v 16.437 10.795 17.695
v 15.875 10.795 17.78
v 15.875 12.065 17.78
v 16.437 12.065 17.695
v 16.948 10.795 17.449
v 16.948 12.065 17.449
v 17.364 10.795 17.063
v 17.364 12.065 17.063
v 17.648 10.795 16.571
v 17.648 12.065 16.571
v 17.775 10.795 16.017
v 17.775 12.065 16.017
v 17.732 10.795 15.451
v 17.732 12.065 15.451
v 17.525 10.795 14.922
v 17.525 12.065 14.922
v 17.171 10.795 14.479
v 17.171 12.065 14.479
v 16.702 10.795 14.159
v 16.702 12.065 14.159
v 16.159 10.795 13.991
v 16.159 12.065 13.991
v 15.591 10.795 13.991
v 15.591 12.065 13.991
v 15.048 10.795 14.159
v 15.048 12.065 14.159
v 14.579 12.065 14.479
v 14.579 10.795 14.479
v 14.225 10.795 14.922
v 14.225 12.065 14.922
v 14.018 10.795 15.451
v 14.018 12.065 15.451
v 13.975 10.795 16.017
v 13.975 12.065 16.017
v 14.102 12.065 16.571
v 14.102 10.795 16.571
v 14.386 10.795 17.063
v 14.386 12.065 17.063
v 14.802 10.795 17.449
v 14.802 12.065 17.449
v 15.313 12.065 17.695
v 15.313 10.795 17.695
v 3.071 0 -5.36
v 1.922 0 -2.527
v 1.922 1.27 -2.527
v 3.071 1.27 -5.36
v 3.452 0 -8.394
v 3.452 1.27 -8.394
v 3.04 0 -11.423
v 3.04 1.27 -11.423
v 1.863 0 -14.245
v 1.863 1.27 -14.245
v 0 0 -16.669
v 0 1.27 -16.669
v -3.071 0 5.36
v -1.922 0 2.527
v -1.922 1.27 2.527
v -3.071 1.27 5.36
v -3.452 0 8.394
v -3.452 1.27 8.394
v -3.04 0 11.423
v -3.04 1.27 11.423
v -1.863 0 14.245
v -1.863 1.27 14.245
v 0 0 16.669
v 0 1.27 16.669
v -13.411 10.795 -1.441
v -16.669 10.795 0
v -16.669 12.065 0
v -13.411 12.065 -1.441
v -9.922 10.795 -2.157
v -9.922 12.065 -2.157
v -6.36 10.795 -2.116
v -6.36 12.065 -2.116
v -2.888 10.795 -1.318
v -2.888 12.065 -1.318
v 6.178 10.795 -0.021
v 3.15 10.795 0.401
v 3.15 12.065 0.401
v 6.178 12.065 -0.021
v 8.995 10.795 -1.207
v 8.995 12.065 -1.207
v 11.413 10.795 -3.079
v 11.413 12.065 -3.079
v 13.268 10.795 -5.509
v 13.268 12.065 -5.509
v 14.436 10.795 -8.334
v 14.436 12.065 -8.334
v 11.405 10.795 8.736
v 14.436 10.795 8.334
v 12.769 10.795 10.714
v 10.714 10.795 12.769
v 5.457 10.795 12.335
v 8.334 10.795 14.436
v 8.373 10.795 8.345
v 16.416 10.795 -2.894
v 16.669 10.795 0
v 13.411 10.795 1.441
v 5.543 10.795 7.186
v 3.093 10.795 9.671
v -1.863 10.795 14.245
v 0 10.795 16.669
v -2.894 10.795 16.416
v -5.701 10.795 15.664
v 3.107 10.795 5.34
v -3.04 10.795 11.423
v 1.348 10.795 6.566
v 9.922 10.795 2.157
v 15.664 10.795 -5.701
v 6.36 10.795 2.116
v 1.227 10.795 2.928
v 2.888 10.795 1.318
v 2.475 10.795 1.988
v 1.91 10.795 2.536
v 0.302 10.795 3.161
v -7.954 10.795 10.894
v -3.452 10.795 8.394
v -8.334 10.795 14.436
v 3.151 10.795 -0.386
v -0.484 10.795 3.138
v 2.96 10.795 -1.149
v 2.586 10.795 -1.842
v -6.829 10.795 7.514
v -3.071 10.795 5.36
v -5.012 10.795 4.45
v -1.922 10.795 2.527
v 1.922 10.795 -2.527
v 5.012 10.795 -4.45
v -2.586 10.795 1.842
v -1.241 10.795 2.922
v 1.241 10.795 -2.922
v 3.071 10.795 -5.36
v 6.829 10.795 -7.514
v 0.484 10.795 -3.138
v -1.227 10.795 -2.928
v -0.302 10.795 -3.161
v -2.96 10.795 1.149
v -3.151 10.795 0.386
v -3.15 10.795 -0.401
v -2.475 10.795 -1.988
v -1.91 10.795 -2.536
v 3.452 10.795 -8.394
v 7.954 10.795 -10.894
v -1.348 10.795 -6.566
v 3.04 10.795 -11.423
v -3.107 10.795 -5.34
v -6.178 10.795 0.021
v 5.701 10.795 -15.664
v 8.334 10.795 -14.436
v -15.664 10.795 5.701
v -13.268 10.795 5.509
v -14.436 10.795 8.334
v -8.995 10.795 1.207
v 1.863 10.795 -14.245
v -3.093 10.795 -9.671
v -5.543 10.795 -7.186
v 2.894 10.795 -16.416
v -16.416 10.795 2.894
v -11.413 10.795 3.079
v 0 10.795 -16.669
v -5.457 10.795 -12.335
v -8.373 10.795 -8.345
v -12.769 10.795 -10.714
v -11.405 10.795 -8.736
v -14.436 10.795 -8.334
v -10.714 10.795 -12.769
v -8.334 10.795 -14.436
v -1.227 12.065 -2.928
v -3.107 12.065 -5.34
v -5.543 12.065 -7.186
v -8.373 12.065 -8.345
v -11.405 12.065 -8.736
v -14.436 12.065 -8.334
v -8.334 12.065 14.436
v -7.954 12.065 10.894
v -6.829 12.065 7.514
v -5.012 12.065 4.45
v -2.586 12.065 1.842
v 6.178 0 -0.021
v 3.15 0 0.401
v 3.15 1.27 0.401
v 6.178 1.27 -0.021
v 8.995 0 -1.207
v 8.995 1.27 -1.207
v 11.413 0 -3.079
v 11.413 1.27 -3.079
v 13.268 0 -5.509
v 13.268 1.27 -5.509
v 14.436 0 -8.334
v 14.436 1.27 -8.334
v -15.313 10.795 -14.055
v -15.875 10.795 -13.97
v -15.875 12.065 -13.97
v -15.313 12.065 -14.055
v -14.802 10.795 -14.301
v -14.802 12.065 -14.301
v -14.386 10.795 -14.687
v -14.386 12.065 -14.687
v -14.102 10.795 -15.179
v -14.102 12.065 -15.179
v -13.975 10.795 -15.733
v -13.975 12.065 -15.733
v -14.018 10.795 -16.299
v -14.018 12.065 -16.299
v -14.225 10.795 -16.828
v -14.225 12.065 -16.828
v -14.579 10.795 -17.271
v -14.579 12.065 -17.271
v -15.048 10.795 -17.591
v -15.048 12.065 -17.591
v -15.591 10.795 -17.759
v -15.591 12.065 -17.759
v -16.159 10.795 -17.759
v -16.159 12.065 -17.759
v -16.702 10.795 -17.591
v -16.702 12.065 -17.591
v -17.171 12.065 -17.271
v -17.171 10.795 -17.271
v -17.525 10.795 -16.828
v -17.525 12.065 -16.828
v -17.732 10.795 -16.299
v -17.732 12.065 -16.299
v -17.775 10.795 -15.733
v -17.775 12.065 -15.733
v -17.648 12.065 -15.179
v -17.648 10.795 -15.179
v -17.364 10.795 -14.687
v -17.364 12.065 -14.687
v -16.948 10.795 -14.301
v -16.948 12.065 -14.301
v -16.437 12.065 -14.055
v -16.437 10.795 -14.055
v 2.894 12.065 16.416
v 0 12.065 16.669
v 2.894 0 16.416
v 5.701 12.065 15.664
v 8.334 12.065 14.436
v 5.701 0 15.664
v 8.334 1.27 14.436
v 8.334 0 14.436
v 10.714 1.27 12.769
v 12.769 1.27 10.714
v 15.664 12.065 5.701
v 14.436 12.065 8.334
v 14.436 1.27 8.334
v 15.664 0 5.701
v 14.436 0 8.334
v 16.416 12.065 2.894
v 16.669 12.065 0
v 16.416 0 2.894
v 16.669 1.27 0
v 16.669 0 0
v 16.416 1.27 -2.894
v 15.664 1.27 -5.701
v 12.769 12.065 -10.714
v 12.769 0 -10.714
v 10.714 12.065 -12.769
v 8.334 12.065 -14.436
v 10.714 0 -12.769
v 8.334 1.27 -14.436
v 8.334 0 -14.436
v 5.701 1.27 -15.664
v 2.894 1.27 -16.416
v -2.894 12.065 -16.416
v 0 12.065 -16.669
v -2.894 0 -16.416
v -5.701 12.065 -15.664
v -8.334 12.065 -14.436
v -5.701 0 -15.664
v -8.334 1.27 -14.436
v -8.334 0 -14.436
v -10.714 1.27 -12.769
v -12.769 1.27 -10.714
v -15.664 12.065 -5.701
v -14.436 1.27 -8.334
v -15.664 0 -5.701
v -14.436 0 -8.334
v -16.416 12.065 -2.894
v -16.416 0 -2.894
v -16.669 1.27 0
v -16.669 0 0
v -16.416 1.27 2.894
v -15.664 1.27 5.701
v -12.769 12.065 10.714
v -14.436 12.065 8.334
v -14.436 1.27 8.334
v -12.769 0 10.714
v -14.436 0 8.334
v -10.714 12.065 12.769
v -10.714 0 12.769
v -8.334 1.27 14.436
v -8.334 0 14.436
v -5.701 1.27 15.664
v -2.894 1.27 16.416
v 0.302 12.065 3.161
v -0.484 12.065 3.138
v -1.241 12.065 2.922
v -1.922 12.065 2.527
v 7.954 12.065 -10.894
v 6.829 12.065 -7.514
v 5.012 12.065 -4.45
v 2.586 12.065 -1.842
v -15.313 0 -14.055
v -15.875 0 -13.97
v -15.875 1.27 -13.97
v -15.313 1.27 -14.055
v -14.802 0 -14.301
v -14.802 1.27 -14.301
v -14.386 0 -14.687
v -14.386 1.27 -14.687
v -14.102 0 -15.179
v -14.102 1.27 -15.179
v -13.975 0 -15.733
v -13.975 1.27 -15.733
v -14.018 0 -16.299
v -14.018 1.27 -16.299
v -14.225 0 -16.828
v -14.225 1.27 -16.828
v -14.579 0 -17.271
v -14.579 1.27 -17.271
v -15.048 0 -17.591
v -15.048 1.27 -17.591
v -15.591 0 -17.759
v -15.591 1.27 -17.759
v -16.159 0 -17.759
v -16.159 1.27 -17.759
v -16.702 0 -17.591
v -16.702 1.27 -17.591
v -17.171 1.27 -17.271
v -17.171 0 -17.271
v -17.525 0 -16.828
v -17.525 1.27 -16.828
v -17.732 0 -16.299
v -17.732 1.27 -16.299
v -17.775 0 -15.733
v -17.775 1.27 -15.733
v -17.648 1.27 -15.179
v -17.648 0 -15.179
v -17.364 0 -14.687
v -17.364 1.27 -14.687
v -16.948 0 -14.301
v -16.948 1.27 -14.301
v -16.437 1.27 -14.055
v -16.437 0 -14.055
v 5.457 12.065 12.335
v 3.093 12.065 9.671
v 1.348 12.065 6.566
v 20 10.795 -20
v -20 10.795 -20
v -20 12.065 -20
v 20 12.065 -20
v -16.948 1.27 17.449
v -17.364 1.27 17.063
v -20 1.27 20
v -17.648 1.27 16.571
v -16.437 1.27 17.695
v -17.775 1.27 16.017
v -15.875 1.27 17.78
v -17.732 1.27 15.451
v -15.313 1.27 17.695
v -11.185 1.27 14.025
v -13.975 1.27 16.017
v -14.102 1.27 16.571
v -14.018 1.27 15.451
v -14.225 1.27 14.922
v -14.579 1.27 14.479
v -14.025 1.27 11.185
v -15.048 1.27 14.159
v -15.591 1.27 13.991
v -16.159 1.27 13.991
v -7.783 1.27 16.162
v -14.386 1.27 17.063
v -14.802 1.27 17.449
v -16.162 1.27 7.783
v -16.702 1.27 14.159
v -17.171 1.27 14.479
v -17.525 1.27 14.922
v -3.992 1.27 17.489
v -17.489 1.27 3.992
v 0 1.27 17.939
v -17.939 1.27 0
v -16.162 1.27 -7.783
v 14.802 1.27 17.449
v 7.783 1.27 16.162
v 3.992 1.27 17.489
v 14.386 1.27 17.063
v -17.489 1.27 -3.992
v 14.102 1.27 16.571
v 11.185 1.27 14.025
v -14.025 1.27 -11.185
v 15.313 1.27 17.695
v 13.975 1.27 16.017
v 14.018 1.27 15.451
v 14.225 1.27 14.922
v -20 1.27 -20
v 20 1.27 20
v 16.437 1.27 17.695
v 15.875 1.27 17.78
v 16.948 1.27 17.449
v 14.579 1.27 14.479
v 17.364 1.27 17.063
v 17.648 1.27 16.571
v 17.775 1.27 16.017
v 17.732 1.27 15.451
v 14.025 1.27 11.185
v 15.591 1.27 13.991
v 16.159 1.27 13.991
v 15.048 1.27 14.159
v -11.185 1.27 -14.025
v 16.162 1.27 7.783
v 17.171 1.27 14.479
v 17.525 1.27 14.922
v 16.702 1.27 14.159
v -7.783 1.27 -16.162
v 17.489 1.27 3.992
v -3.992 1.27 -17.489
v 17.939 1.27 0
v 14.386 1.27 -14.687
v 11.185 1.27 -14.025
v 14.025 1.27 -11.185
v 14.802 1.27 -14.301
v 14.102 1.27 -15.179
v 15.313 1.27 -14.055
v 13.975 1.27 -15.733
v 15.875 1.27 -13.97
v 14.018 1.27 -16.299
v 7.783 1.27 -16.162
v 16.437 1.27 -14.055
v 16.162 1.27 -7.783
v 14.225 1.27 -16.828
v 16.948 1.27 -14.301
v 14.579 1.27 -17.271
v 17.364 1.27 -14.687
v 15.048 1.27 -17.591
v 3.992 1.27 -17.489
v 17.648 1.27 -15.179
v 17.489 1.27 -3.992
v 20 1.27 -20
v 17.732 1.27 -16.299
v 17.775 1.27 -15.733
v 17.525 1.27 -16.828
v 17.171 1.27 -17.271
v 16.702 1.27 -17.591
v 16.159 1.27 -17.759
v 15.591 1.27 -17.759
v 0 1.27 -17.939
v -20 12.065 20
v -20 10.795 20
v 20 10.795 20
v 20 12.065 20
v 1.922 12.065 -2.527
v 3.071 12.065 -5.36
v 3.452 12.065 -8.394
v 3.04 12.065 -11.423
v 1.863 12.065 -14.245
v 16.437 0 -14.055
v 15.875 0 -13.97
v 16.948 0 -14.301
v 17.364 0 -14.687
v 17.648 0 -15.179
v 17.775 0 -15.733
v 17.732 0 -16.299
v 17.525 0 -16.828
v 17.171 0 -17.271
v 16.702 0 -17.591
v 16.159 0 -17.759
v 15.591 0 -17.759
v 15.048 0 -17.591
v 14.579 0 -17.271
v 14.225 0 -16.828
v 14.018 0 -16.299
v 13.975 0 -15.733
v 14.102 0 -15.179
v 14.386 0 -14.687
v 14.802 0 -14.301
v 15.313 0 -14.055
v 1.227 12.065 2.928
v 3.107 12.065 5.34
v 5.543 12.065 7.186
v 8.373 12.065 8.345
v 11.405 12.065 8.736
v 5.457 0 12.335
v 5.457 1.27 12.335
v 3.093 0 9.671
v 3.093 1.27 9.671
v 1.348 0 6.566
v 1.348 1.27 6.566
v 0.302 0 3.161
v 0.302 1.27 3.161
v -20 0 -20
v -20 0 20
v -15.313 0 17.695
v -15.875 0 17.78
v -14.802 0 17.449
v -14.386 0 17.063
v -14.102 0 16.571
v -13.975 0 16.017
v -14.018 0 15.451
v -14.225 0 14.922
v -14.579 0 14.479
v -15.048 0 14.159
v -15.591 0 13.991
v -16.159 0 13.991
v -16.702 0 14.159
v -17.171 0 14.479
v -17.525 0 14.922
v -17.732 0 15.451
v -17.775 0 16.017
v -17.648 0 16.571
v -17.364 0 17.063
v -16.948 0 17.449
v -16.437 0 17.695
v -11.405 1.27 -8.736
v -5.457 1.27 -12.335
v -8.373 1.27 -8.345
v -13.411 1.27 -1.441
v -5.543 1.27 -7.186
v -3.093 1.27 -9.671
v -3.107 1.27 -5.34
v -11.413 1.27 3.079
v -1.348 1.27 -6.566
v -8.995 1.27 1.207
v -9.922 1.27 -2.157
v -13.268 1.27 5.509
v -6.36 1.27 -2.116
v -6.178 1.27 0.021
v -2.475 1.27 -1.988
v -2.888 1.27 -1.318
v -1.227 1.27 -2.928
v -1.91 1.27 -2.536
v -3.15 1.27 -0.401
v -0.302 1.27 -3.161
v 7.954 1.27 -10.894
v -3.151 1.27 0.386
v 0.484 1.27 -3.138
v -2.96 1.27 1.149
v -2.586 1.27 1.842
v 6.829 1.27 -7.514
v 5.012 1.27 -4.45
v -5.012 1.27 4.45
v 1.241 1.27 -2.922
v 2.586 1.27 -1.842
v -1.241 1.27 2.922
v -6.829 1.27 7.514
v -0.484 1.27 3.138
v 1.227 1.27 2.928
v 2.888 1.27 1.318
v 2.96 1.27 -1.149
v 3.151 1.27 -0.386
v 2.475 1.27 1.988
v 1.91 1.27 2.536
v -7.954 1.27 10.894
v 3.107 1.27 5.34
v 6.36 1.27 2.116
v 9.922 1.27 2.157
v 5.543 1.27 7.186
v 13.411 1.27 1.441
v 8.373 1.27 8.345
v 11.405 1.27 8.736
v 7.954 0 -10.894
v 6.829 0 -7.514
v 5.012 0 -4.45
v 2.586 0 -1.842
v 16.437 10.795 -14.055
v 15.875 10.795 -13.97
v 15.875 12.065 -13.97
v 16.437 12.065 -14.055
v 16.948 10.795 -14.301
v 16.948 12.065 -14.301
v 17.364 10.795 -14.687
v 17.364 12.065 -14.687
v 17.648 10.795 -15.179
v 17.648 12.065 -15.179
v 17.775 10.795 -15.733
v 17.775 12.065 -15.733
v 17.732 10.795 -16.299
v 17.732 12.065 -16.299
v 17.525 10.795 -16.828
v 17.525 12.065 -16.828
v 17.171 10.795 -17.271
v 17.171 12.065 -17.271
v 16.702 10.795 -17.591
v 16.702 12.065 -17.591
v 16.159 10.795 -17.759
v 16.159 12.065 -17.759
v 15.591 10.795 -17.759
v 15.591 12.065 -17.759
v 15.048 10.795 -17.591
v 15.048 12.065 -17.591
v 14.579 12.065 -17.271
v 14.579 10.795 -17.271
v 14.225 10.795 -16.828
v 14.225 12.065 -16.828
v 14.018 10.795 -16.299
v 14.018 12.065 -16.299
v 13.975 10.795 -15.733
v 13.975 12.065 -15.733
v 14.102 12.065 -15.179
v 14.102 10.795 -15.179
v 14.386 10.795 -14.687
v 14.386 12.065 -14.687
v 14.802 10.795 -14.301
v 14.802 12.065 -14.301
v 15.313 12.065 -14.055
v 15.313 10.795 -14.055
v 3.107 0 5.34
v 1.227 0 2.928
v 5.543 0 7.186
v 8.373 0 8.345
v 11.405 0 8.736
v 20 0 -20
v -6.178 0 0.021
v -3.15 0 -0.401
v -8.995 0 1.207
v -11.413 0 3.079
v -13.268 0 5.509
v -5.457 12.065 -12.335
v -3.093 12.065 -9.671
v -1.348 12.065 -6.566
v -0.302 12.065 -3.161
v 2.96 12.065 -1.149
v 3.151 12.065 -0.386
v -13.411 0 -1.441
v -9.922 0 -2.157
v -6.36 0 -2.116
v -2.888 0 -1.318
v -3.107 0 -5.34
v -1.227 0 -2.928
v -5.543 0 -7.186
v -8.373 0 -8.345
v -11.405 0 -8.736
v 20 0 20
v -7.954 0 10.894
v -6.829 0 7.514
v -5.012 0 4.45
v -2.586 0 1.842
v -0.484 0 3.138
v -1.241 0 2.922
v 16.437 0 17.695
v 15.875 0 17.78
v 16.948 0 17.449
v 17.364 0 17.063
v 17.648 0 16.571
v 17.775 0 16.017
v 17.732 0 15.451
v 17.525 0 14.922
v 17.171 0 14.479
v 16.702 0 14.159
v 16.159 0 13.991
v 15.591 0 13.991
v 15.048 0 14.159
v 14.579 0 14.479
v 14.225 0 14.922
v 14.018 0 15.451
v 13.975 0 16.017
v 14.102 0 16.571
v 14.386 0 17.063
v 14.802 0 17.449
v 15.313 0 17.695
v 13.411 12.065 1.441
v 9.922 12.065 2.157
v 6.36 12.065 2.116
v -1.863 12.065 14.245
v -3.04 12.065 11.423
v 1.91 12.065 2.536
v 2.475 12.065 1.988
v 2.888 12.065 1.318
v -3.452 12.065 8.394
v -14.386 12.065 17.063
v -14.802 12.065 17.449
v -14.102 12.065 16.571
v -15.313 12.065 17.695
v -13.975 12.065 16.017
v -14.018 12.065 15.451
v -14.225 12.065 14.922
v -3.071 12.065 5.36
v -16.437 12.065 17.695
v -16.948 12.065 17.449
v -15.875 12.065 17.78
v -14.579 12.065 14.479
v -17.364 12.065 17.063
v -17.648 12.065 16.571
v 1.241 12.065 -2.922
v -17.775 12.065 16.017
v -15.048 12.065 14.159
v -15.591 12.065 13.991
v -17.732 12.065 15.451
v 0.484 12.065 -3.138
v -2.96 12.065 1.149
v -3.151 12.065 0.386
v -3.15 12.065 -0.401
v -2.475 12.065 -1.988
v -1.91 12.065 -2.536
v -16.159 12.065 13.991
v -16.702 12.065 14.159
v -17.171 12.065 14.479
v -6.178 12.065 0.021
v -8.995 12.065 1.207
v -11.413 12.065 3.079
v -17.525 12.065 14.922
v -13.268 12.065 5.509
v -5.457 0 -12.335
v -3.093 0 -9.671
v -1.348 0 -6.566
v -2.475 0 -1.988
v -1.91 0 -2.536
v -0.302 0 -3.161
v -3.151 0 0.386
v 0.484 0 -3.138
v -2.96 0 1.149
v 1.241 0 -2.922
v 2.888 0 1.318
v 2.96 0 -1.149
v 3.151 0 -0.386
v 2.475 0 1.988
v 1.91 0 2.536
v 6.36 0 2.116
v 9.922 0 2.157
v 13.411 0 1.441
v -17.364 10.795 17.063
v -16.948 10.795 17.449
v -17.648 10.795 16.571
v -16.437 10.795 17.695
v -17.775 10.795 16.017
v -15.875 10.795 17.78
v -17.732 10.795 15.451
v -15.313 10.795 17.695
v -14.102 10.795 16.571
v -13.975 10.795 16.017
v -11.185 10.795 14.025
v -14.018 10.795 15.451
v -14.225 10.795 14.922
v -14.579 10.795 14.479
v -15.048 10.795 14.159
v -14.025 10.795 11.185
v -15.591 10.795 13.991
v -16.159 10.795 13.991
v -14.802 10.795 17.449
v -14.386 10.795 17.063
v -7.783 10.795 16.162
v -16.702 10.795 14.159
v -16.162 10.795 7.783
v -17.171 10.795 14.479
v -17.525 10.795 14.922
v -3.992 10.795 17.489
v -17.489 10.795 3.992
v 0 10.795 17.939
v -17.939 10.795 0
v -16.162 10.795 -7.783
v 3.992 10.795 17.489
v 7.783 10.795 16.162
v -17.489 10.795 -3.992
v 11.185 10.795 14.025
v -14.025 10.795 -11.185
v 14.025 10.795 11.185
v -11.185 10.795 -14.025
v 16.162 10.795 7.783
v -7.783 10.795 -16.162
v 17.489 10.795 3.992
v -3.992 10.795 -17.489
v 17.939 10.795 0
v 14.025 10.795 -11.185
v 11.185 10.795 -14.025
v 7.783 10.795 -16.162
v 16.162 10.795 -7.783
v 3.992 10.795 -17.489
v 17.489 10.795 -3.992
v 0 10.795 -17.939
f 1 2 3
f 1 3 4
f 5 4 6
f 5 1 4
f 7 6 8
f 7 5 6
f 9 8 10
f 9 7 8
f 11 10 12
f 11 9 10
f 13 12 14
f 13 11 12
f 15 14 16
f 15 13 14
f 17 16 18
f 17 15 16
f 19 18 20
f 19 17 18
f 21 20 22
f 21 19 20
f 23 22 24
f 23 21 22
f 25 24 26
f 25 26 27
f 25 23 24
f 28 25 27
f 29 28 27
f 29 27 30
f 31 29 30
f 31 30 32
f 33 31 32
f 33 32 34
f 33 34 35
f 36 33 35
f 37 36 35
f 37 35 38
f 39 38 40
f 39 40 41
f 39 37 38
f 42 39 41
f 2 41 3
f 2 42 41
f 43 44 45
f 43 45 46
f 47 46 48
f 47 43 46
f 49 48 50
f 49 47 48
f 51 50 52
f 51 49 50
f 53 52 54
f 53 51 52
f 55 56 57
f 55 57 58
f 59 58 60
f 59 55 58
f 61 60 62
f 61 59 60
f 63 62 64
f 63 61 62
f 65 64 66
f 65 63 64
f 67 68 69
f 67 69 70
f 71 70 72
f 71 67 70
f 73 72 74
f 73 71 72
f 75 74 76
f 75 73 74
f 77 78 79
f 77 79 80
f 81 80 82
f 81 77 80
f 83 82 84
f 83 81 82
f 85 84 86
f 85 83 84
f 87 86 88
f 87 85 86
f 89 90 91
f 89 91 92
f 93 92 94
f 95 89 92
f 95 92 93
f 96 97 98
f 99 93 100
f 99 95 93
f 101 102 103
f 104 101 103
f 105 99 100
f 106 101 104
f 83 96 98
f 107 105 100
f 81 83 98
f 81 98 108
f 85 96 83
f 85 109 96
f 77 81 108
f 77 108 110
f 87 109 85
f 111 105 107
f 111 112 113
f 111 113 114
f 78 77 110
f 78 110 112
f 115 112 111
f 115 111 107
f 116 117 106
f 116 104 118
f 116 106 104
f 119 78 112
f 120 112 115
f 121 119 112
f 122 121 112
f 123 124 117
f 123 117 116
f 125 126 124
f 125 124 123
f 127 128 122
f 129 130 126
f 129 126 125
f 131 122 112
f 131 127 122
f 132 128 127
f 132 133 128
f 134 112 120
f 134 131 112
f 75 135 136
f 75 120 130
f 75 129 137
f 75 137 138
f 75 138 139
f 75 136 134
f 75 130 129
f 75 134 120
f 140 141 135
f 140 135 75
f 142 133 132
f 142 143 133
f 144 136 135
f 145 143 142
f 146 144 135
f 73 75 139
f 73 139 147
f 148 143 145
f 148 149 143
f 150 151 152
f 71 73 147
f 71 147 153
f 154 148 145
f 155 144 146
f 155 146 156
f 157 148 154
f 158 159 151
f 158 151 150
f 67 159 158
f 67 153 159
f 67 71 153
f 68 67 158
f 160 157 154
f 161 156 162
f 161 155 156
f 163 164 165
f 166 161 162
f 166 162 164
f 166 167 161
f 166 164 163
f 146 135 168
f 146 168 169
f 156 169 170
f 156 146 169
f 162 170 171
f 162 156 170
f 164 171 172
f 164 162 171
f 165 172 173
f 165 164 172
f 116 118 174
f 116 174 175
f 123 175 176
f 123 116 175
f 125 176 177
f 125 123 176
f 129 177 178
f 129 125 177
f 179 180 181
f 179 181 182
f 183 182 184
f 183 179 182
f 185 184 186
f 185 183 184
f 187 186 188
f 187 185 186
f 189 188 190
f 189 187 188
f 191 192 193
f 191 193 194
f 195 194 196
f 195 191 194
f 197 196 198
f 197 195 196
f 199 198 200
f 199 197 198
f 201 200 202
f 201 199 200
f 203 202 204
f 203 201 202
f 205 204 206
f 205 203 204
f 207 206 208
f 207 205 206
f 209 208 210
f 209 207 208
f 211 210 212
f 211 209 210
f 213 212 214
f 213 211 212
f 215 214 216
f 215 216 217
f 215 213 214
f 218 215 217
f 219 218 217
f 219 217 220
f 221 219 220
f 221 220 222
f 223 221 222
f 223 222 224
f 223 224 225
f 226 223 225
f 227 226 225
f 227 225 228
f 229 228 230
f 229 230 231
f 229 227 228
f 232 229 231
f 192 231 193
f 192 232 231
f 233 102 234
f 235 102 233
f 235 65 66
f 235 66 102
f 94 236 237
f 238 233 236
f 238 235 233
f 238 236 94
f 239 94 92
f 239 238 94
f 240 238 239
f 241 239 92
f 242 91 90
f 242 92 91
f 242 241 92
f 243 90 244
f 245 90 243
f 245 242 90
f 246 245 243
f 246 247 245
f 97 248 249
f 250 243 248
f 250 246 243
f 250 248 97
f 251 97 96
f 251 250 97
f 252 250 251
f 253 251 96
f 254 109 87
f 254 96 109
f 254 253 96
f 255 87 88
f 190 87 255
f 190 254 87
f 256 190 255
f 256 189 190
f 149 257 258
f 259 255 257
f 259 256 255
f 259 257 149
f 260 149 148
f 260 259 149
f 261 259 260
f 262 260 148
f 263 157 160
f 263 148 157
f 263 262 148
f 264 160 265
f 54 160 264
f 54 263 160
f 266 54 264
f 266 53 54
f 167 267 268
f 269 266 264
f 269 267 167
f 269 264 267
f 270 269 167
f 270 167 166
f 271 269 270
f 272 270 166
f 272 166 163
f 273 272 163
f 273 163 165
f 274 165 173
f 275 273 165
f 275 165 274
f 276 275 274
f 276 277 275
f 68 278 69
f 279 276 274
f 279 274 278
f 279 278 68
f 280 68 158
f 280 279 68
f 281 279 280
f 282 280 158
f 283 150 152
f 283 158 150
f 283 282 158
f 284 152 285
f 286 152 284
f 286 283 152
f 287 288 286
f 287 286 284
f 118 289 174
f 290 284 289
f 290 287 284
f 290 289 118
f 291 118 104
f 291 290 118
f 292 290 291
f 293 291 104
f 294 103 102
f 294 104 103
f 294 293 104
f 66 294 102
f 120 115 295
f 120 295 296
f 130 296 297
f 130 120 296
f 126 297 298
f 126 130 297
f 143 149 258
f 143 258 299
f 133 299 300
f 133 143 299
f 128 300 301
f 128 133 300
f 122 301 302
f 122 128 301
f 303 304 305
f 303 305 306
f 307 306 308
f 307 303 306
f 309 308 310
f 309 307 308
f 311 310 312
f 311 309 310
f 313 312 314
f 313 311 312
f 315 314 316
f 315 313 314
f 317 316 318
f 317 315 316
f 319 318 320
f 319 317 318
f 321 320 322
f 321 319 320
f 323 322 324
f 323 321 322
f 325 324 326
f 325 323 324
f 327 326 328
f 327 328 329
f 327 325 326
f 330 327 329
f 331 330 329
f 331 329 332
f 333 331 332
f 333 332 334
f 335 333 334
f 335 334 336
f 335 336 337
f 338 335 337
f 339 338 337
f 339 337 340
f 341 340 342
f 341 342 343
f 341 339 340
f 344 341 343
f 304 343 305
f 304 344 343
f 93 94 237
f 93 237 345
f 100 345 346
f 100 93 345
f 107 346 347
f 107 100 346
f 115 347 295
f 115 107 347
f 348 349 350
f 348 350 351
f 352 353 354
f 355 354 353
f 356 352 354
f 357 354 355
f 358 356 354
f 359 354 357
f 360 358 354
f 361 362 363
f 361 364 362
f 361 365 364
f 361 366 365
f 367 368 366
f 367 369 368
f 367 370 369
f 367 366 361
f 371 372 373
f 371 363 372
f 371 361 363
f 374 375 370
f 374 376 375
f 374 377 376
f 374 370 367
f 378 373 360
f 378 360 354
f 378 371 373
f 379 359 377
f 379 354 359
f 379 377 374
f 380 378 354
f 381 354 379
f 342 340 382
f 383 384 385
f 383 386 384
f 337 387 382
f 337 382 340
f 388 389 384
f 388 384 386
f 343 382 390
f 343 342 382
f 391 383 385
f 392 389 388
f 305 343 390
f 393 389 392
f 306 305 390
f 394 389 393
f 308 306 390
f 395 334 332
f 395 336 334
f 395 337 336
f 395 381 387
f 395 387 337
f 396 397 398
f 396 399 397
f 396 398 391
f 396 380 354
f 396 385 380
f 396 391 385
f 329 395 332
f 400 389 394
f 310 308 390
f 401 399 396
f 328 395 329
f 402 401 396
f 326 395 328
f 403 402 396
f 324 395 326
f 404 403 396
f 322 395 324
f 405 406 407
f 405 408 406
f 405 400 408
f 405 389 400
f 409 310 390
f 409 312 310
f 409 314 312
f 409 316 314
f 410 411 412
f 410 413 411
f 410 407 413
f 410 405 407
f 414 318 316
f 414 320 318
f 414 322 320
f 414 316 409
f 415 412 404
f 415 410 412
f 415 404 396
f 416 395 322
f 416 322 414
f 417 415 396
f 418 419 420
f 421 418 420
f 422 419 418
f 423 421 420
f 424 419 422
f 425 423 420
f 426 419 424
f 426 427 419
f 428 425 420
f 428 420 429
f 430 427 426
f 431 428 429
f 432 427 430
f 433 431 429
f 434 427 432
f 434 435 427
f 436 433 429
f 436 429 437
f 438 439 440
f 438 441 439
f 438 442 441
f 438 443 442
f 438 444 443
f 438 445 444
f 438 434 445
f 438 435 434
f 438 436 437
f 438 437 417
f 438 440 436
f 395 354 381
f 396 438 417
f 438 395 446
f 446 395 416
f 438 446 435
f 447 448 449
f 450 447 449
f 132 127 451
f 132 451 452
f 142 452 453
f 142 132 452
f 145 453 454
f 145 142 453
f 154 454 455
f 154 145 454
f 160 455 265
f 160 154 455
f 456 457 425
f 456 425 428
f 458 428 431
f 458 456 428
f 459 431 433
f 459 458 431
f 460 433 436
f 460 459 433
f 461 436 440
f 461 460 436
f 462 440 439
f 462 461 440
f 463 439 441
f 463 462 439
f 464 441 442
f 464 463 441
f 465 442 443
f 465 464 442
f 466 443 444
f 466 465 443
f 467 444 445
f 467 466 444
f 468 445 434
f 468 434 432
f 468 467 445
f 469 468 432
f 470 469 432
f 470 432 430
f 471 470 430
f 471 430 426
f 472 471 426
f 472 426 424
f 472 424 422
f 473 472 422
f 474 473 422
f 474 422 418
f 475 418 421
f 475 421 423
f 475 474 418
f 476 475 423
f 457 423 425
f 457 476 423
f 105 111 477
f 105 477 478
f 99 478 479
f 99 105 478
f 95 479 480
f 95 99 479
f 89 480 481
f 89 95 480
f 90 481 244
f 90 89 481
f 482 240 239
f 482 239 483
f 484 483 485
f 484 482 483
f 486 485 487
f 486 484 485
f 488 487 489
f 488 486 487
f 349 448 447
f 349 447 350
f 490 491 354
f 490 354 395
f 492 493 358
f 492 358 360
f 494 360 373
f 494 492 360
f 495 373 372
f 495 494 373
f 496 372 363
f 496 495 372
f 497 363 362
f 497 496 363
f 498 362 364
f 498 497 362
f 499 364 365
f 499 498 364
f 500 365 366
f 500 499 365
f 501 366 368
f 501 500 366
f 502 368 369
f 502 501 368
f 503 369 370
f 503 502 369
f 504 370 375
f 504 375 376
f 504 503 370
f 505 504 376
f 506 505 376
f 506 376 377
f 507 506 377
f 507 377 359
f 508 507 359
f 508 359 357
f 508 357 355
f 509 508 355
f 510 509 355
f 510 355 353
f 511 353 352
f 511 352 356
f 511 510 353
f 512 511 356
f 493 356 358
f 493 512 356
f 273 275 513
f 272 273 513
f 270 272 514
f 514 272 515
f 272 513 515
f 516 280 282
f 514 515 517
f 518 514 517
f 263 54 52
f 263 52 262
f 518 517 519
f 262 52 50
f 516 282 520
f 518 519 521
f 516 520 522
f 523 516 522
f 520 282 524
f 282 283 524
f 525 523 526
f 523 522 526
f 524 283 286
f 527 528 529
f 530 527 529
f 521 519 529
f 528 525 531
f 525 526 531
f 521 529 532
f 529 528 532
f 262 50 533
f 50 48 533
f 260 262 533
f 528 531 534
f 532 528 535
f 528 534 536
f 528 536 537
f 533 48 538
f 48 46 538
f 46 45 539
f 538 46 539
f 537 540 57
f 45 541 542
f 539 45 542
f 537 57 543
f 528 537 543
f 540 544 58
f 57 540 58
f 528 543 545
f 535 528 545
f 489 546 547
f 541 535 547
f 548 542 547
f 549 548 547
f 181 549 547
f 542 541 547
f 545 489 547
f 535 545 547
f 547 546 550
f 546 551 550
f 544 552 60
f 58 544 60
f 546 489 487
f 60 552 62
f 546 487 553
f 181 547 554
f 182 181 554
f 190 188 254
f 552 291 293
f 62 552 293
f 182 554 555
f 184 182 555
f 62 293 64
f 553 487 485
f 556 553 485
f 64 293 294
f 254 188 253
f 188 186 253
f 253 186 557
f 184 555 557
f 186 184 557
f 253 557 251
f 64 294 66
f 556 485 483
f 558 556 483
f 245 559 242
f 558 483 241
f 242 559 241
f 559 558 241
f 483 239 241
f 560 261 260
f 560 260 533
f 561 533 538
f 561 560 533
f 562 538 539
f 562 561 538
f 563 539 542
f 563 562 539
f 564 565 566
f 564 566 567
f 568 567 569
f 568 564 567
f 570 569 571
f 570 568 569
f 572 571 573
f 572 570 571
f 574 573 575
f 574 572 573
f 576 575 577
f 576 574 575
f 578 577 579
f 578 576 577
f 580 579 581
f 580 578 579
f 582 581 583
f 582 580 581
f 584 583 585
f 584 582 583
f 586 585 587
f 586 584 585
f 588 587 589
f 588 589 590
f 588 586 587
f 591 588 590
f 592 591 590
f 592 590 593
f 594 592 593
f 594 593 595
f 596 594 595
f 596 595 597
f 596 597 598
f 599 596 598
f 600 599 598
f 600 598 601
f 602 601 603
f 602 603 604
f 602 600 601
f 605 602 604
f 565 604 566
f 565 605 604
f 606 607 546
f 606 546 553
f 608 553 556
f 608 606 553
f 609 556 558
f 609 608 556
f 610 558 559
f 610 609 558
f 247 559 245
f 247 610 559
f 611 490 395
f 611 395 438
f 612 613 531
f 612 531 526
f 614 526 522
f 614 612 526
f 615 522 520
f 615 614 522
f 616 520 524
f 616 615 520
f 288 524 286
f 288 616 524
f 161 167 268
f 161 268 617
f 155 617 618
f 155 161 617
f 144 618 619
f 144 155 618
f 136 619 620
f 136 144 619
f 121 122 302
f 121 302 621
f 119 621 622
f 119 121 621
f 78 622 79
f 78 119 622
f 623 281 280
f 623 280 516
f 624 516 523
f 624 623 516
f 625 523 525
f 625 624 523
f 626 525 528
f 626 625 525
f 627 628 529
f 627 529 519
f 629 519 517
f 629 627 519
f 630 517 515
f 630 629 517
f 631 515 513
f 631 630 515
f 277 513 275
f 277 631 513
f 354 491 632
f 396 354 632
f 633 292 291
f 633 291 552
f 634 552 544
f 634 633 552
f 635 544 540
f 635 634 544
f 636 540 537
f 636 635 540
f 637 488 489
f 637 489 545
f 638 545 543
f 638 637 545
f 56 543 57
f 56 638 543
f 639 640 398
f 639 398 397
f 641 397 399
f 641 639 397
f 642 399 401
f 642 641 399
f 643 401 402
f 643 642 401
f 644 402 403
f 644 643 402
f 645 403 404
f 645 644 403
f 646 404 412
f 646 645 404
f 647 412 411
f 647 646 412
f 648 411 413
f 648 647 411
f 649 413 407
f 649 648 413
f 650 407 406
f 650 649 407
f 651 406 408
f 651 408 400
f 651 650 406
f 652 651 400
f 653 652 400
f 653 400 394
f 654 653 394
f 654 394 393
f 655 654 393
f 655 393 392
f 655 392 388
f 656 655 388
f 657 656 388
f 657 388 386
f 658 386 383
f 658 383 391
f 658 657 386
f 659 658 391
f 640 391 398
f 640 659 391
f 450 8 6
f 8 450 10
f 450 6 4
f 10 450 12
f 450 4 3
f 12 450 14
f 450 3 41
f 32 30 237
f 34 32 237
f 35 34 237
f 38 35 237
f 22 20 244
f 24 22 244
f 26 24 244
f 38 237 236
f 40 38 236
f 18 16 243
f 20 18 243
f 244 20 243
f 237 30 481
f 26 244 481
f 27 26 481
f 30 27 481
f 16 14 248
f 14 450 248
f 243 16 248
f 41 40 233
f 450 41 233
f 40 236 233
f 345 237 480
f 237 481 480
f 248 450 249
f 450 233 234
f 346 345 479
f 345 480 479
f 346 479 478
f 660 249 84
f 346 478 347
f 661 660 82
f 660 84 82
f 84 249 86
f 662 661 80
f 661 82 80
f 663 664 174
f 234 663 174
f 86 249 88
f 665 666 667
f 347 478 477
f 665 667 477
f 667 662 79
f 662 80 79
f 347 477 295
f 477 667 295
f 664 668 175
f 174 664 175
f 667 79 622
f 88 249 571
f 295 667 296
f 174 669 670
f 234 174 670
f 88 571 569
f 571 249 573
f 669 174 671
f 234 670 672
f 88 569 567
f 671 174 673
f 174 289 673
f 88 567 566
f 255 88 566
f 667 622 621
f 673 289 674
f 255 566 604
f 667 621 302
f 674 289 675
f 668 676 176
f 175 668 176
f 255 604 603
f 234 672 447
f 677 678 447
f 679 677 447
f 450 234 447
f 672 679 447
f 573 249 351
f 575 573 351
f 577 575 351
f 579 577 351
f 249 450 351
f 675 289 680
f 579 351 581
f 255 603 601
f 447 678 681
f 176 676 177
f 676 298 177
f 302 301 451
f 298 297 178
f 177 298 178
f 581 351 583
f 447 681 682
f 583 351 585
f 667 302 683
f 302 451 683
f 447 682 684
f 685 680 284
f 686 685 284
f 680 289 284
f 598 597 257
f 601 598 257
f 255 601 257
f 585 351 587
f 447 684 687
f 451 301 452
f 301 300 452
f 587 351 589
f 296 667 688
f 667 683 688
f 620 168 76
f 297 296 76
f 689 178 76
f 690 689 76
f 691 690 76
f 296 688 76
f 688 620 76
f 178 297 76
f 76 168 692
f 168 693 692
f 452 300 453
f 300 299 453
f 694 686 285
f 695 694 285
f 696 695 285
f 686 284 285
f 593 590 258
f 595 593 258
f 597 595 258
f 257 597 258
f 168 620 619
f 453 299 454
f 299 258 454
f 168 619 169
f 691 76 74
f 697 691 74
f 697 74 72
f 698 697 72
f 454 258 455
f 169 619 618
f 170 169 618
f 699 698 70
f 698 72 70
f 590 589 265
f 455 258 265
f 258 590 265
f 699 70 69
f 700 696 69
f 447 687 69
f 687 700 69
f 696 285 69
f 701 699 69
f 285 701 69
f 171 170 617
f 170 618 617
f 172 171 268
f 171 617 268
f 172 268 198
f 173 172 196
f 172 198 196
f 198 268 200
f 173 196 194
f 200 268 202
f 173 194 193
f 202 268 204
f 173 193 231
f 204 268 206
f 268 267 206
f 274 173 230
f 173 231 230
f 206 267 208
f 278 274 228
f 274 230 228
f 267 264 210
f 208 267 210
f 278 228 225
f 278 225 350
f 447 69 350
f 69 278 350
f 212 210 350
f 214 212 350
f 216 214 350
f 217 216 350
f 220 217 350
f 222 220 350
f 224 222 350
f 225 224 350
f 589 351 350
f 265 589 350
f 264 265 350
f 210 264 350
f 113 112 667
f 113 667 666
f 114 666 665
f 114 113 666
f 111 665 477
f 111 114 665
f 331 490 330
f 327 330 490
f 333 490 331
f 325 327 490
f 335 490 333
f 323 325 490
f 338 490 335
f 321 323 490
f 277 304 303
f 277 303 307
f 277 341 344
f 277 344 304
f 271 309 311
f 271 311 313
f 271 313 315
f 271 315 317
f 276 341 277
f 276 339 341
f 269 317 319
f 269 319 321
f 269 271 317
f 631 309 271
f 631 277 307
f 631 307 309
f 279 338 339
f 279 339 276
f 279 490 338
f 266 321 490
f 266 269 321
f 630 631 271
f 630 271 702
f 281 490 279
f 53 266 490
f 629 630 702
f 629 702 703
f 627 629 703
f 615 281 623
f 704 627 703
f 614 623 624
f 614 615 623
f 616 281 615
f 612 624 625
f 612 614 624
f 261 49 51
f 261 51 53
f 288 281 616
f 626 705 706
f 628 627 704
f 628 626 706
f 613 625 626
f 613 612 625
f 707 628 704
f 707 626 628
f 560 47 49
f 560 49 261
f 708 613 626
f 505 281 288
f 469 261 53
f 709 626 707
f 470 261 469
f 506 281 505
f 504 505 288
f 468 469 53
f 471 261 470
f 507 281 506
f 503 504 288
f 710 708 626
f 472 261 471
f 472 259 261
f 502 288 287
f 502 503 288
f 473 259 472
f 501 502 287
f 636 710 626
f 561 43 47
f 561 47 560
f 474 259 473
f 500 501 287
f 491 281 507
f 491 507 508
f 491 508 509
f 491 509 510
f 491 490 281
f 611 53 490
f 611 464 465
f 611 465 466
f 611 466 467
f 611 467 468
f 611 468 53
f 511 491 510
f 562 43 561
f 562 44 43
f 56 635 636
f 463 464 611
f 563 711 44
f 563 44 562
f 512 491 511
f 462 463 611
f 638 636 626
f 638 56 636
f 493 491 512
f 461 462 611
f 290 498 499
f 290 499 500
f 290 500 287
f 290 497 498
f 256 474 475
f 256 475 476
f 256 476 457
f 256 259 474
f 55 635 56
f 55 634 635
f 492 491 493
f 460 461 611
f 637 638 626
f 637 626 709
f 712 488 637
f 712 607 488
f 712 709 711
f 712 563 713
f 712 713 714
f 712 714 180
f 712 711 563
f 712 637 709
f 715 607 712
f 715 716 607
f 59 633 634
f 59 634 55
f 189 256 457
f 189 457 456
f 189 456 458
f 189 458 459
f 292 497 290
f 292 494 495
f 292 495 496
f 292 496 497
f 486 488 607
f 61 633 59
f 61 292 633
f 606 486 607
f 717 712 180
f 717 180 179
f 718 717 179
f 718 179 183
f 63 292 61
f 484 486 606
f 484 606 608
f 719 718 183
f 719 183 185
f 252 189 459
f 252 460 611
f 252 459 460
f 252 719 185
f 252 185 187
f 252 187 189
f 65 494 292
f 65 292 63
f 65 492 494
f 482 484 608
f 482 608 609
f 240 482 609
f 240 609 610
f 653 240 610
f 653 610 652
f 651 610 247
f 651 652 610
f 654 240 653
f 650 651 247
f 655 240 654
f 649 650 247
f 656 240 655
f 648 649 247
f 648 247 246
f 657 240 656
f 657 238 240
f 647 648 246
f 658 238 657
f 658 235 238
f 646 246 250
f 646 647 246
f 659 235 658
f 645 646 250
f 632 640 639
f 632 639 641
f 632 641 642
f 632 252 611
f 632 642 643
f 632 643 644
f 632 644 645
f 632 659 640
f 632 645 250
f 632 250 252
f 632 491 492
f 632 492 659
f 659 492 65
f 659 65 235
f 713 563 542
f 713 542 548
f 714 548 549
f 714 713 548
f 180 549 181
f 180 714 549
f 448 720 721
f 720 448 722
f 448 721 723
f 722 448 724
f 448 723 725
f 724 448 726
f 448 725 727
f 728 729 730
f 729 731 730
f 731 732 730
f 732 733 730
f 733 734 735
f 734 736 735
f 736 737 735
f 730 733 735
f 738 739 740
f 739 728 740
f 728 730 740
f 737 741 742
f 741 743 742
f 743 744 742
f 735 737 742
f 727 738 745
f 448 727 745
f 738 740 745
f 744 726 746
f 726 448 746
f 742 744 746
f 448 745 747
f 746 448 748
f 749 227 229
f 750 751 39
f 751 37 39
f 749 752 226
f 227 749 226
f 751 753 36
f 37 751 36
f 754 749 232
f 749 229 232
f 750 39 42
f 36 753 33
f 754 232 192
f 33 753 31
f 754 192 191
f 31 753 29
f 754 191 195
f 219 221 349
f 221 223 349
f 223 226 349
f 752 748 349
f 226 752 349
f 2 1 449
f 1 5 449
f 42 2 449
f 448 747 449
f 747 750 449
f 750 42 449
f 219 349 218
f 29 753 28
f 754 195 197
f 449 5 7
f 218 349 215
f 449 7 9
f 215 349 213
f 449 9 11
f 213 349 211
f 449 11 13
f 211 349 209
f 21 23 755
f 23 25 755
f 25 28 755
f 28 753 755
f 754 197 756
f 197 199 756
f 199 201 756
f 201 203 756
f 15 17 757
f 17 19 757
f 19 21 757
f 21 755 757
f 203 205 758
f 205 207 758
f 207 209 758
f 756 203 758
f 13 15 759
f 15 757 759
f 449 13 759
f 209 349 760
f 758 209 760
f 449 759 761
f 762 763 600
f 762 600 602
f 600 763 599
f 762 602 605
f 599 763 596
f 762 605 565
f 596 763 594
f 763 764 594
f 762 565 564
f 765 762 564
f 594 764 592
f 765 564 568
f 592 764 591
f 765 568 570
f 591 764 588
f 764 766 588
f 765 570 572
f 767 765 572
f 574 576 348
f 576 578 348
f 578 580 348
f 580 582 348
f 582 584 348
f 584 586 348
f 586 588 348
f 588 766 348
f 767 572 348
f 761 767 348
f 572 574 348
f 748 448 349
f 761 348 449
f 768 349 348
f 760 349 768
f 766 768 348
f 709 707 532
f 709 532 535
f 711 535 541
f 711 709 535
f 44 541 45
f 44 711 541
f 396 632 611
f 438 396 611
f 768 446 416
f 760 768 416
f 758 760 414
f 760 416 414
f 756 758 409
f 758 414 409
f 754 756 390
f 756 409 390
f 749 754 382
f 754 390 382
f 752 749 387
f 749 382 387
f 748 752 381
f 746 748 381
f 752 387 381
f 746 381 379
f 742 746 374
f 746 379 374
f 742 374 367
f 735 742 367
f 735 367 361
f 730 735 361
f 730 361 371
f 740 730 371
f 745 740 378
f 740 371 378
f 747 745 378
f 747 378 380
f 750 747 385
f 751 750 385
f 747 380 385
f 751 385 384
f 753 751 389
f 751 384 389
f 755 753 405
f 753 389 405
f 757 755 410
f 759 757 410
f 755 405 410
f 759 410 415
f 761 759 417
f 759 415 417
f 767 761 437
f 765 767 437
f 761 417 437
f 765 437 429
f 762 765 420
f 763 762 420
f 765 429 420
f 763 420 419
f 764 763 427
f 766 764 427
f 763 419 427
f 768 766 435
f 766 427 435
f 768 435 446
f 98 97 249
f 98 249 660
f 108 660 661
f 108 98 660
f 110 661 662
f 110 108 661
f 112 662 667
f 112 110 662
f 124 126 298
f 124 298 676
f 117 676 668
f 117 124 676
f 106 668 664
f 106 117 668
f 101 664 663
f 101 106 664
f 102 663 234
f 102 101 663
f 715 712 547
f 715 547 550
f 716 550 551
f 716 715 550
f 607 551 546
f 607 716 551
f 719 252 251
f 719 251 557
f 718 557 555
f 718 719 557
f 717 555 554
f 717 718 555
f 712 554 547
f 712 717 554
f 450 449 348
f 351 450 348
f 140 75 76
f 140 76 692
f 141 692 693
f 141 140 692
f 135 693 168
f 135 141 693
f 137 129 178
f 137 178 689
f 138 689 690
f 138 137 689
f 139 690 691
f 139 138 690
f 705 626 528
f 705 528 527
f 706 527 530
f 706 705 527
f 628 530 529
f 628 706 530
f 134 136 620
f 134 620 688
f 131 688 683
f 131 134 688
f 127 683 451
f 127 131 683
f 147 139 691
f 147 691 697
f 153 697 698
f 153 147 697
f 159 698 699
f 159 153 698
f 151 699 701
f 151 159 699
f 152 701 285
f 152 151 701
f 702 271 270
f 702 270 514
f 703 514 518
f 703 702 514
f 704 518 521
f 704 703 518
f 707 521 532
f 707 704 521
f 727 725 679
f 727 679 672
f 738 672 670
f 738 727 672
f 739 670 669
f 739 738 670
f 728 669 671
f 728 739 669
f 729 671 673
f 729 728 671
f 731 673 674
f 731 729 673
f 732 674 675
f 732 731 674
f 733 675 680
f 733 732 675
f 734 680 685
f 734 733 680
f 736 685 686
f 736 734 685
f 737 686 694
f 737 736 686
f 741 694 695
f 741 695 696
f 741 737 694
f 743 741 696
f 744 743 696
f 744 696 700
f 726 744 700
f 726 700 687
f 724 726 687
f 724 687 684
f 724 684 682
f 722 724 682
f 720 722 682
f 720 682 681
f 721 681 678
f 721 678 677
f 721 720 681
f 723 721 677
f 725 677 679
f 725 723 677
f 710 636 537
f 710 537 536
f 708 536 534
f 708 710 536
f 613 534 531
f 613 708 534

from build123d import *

# Parameters (mm, degrees)
SKETCH1_W           = 40
SKETCH1_H           = 40
SKETCH1_R           = 16.66875
SKETCH1_R_2         = 1.905
BOSS_EXTRUDE1_DEPTH = 1.27
SKETCH2_R           = 17.93875
SKETCH2_R_2         = 16.66875
BOSS_EXTRUDE2_DEPTH = 9.525
SKETCH3_W           = 40
SKETCH3_H           = 40
SKETCH3_R           = 16.66875
SKETCH3_R_2         = 1.905
BOSS_EXTRUDE3_DEPTH = 1.27
BOSS_EXTRUDE4_DEPTH = 1.27
BOSS_EXTRUDE5_START = -1.27
BOSS_EXTRUDE5_DEPTH = 1.27


with BuildPart() as part:
    # Sketch1 → Boss-Extrude1 (new body)
    with BuildSketch(Plane(origin=(0, 0, 0), x_dir=(1, 0, 0), z_dir=(0, 1, 0))):
        Rectangle(SKETCH1_W, SKETCH1_H)
        Circle(SKETCH1_R, mode=Mode.SUBTRACT)
        with Locations((-15.875, 15.875)):
            Circle(SKETCH1_R_2, mode=Mode.SUBTRACT)
        with Locations((15.875, 15.875)):
            Circle(SKETCH1_R_2, mode=Mode.SUBTRACT)
        with Locations((-15.875, -15.875)):
            Circle(SKETCH1_R_2, mode=Mode.SUBTRACT)
        with Locations((15.875, -15.875)):
            Circle(SKETCH1_R_2, mode=Mode.SUBTRACT)
    extrude(amount=BOSS_EXTRUDE1_DEPTH)

    # Sketch2 → Boss-Extrude2 (add)
    with BuildSketch(Plane(origin=(0, 1.27, 0), x_dir=(1, 0, 0), z_dir=(0, 1, 0))):
        Circle(SKETCH2_R)
        Circle(SKETCH2_R_2, mode=Mode.SUBTRACT)
    extrude(amount=BOSS_EXTRUDE2_DEPTH)

    # Sketch3 → Boss-Extrude3 (add)
    with BuildSketch(Plane(origin=(0, 10.795, 0), x_dir=(1, 0, 0), z_dir=(0, 1, 0))):
        Rectangle(SKETCH3_W, SKETCH3_H)
        Circle(SKETCH3_R, mode=Mode.SUBTRACT)
        with Locations((-15.875, 15.875)):
            Circle(SKETCH3_R_2, mode=Mode.SUBTRACT)
        with Locations((15.875, 15.875)):
            Circle(SKETCH3_R_2, mode=Mode.SUBTRACT)
        with Locations((-15.875, -15.875)):
            Circle(SKETCH3_R_2, mode=Mode.SUBTRACT)
        with Locations((15.875, -15.875)):
            Circle(SKETCH3_R_2, mode=Mode.SUBTRACT)
    extrude(amount=BOSS_EXTRUDE3_DEPTH)

    # Sketch4 → Boss-Extrude4 (add)
    with BuildSketch(Plane.XZ):
        with BuildLine():
            ThreePointArc((-2.585941795, 1.84215364), (-3.079306216, 0.773626673), (-3.149549386, -0.401202774))
            ThreePointArc((-3.149549386, -0.401202774), (-10.265002832, 2.064243556), (-14.435560949, 8.334375))
            ThreePointArc((-14.435560949, 8.334375), (-16.100776117, 4.314189958), (-16.66875, 0))
            ThreePointArc((-16.66875, 0), (-9.921875, -2.157421613), (-2.888322747, -1.318414467))
            ThreePointArc((-2.888322747, -1.318414467), (-2.20963346, -2.279944073), (-1.227322899, -2.928191166))
            ThreePointArc((-1.227322899, -2.928191166), (-6.920188775, -7.857631444), (-14.435560949, -8.334375))
            ThreePointArc((-14.435560949, -8.334375), (-11.786586159, -11.786586159), (-8.334375, -14.435560949))
            ThreePointArc((-8.334375, -14.435560949), (-3.092555577, -9.67130661), (-0.302380952, -3.160568107))
            ThreePointArc((-0.302380952, -3.160568107), (0.869672756, -3.053570745), (1.922226487, -2.526988392))
            ThreePointArc((1.922226487, -2.526988392), (3.344814057, -9.921875), (0, -16.66875))
            ThreePointArc((0, -16.66875), (4.314189958, -16.100776117), (8.334375, -14.435560949))
            ThreePointArc((8.334375, -14.435560949), (6.829319423, -7.513884997), (2.585941795, -1.84215364))
            ThreePointArc((2.585941795, -1.84215364), (3.079306216, -0.773626673), (3.149549386, 0.401202774))
            ThreePointArc((3.149549386, 0.401202774), (10.265002832, -2.064243556), (14.435560949, -8.334375))
            ThreePointArc((14.435560949, -8.334375), (16.100776117, -4.314189958), (16.66875, 0))
            ThreePointArc((16.66875, 0), (9.921875, 2.157421613), (2.888322747, 1.318414467))
            ThreePointArc((2.888322747, 1.318414467), (2.20963346, 2.279944073), (1.227322899, 2.928191166))
            ThreePointArc((1.227322899, 2.928191166), (6.920188775, 7.857631444), (14.435560949, 8.334375))
            ThreePointArc((14.435560949, 8.334375), (11.786586159, 11.786586159), (8.334375, 14.435560949))
            ThreePointArc((8.334375, 14.435560949), (3.092555577, 9.67130661), (0.302380952, 3.160568107))
            ThreePointArc((0.302380952, 3.160568107), (-0.869672756, 3.053570745), (-1.922226487, 2.526988392))
            ThreePointArc((-1.922226487, 2.526988392), (-3.344814057, 9.921875), (0, 16.66875))
            ThreePointArc((0, 16.66875), (-4.314189958, 16.100776117), (-8.334375, 14.435560949))
            ThreePointArc((-8.334375, 14.435560949), (-6.829319423, 7.513884997), (-2.585941795, 1.84215364))
        make_face()
    extrude(amount=-BOSS_EXTRUDE4_DEPTH)

    # Sketch5 → Boss-Extrude5 (add)
    with BuildSketch(Plane(origin=(0, 12.065, 0), x_dir=(1, 0, 0), z_dir=(0, 1, 0)).offset(BOSS_EXTRUDE5_START)):
        with BuildLine():
            ThreePointArc((1.227322899, -2.928191166), (6.920188775, -7.857631444), (14.435560949, -8.334375))
            ThreePointArc((14.435560949, -8.334375), (11.786586159, -11.786586159), (8.334375, -14.435560949))
            ThreePointArc((8.334375, -14.435560949), (3.092555577, -9.67130661), (0.302380952, -3.160568107))
            ThreePointArc((0.302380952, -3.160568107), (-0.869672756, -3.053570745), (-1.922226487, -2.526988392))
            ThreePointArc((-1.922226487, -2.526988392), (-3.344814057, -9.921875), (0, -16.66875))
            ThreePointArc((0, -16.66875), (-4.314189958, -16.100776117), (-8.334375, -14.435560949))
            ThreePointArc((-8.334375, -14.435560949), (-6.829319423, -7.513884997), (-2.585941795, -1.84215364))
            ThreePointArc((-2.585941795, -1.84215364), (-3.079306216, -0.773626673), (-3.149549386, 0.401202774))
            ThreePointArc((-3.149549386, 0.401202774), (-10.265002832, -2.064243556), (-14.435560949, -8.334375))
            ThreePointArc((-14.435560949, -8.334375), (-16.100776117, -4.314189958), (-16.66875, 0))
            ThreePointArc((-16.66875, 0), (-9.921875, 2.157421613), (-2.888322747, 1.318414467))
            ThreePointArc((-2.888322747, 1.318414467), (-2.20963346, 2.279944073), (-1.227322899, 2.928191166))
            ThreePointArc((-1.227322899, 2.928191166), (-6.920188775, 7.857631444), (-14.435560949, 8.334375))
            ThreePointArc((-14.435560949, 8.334375), (-11.786586159, 11.786586159), (-8.334375, 14.435560949))
            ThreePointArc((-8.334375, 14.435560949), (-3.092555577, 9.67130661), (-0.302380952, 3.160568107))
            ThreePointArc((-0.302380952, 3.160568107), (0.869672756, 3.053570745), (1.922226487, 2.526988392))
            ThreePointArc((1.922226487, 2.526988392), (3.344814057, 9.921875), (0, 16.66875))
            ThreePointArc((0, 16.66875), (4.314189958, 16.100776117), (8.334375, 14.435560949))
            ThreePointArc((8.334375, 14.435560949), (6.829319423, 7.513884997), (2.585941795, 1.84215364))
            ThreePointArc((2.585941795, 1.84215364), (3.079306216, 0.773626673), (3.149549386, -0.401202774))
            ThreePointArc((3.149549386, -0.401202774), (10.265002832, 2.064243556), (14.435560949, 8.334375))
            ThreePointArc((14.435560949, 8.334375), (16.100776117, 4.314189958), (16.66875, 0))
            ThreePointArc((16.66875, 0), (9.921875, -2.157421613), (2.888322747, -1.318414467))
            ThreePointArc((2.888322747, -1.318414467), (2.20963346, -2.279944073), (1.227322899, -2.928191166))
        make_face()
    extrude(amount=BOSS_EXTRUDE5_DEPTH)


solid = part.part
